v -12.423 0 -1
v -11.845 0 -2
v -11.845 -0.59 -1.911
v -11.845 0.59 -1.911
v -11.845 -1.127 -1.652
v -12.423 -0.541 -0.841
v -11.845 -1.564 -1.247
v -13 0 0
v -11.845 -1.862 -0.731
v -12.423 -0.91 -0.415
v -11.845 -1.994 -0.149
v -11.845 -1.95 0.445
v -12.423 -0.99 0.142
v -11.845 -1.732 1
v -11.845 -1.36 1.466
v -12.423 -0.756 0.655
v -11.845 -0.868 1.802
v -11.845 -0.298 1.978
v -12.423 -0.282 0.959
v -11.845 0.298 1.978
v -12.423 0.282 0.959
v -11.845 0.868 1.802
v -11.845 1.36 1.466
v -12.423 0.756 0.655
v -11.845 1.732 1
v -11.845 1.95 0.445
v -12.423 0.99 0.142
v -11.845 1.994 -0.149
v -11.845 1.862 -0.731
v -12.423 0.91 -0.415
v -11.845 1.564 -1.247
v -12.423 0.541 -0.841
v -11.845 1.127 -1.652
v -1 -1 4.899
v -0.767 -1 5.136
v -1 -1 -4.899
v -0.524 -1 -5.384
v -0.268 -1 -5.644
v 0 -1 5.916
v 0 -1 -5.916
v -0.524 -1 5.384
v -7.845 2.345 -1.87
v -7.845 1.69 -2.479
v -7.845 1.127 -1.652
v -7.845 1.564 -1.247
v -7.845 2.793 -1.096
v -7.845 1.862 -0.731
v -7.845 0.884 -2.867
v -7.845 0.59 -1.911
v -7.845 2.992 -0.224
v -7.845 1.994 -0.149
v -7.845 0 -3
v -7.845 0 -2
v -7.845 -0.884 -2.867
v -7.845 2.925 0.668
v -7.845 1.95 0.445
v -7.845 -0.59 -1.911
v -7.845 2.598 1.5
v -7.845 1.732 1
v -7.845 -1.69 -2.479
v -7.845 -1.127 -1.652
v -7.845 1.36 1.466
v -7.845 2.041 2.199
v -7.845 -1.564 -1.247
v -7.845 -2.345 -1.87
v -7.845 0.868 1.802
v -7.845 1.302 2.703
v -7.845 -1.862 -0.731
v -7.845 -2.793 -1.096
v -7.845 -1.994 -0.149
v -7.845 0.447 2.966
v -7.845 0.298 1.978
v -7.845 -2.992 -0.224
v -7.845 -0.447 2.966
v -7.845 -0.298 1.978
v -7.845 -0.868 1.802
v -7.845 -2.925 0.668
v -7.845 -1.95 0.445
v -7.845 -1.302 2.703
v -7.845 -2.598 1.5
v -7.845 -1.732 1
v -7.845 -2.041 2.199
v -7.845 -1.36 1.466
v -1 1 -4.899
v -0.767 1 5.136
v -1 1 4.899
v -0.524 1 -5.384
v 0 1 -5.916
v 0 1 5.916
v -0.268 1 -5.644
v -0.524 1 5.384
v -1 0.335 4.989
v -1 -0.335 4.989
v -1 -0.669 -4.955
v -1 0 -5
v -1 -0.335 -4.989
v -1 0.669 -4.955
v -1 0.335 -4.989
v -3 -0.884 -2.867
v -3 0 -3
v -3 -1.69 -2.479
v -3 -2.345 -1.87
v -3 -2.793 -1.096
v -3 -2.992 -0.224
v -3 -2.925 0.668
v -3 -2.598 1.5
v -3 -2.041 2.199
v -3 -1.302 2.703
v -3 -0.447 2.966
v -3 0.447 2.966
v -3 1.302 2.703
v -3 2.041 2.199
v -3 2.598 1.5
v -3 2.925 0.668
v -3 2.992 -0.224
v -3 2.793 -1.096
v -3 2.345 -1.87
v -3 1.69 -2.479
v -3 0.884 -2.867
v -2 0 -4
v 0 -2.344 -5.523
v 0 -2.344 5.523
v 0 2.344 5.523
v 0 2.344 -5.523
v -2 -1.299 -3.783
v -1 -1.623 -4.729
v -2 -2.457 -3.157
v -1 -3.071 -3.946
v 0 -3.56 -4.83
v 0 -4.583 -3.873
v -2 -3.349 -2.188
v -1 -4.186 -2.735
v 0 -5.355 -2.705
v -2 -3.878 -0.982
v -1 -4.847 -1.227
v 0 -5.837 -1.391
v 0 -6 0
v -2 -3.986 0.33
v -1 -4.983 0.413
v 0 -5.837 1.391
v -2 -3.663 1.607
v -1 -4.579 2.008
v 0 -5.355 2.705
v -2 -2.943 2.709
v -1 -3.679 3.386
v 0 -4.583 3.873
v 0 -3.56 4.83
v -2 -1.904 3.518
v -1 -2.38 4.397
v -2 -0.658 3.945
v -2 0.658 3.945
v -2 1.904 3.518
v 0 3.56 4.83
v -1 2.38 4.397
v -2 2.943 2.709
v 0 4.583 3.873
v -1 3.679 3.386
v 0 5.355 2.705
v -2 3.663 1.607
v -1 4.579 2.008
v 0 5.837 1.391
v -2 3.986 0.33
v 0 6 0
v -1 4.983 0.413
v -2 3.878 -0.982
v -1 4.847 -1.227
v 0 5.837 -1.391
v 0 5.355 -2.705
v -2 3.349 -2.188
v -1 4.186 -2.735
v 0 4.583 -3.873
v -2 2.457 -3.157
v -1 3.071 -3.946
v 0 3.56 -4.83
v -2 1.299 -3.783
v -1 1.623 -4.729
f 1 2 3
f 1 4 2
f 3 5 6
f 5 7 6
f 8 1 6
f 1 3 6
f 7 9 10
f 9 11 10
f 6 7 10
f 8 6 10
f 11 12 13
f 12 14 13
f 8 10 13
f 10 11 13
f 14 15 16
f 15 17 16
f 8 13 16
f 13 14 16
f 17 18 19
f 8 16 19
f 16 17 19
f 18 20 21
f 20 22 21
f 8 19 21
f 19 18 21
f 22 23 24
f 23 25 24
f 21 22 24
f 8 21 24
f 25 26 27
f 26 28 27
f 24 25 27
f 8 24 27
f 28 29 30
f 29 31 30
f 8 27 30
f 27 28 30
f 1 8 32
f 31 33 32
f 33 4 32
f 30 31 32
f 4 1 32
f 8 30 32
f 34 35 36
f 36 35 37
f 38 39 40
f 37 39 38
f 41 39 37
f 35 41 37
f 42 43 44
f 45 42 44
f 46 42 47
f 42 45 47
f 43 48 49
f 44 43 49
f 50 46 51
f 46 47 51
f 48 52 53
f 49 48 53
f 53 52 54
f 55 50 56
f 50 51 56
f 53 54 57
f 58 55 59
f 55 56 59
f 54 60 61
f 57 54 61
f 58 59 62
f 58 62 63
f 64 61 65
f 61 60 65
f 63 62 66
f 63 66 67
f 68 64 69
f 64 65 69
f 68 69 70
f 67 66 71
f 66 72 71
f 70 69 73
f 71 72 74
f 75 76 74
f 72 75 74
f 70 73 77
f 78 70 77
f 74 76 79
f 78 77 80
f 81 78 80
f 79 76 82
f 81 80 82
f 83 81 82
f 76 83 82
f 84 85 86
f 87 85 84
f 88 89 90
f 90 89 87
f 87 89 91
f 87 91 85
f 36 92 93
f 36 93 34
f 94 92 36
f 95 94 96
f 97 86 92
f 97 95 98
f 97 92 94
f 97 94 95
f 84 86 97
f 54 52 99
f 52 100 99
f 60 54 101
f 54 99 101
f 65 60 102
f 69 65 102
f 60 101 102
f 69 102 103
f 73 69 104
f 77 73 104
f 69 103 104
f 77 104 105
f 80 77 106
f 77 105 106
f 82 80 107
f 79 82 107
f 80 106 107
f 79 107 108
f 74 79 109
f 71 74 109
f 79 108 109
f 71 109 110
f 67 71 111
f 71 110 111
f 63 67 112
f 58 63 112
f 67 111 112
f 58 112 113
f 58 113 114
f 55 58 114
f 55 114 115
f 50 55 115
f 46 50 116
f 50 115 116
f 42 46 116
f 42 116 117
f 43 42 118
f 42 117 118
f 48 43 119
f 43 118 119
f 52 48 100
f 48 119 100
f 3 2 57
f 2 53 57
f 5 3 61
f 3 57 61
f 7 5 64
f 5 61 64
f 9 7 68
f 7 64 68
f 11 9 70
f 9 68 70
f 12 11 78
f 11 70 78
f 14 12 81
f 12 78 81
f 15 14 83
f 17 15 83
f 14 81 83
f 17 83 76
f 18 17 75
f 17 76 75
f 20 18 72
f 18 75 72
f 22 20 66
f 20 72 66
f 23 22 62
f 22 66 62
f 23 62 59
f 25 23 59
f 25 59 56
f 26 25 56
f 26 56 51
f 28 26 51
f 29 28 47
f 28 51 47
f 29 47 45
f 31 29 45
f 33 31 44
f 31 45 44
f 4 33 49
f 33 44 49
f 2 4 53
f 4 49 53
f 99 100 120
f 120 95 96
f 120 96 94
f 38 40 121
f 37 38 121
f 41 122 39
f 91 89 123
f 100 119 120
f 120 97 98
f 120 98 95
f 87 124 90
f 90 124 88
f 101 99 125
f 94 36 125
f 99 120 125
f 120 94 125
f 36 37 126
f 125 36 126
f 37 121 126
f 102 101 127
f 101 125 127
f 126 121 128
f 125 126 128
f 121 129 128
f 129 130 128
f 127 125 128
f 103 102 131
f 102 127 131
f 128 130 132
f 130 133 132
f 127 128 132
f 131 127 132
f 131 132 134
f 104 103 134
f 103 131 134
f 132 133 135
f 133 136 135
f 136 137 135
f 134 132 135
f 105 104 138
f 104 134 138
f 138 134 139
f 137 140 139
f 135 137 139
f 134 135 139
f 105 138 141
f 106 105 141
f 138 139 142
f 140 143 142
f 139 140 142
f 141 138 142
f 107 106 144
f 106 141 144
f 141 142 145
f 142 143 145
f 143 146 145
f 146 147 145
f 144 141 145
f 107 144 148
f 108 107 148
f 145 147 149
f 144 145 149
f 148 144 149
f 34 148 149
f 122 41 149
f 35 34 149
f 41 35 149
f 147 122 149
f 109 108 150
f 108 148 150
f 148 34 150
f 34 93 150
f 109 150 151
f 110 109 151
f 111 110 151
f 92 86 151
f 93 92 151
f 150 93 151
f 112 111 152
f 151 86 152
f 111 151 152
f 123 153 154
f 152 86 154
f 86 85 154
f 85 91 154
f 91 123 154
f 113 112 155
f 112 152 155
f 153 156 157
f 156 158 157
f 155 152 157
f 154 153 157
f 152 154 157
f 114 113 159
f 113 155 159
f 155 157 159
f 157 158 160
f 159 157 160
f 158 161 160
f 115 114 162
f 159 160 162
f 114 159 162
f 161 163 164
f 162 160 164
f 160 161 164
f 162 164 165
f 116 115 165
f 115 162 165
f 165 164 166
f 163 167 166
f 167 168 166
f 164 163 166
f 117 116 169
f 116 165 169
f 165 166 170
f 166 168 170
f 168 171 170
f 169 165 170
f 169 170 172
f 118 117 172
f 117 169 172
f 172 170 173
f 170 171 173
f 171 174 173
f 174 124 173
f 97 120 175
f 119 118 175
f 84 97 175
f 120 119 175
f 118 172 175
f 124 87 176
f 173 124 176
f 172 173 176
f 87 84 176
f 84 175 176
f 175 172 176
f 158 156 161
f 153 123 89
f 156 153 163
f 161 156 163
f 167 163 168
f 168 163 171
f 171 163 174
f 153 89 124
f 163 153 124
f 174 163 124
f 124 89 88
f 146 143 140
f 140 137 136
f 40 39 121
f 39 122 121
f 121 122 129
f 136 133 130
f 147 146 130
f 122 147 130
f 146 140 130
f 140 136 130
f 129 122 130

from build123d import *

# Parameters (mm, degrees)
SKETCH2_W          = 16.237911894
SKETCH2_H          = 2
CUT_EXTRUDE1_DEPTH = 1


with BuildPart() as part:
    # Sketch1 → Revolve1 (revolve)
    with BuildSketch(Plane(origin=(0, 0, 0), x_dir=(1, 0, 0), z_dir=(0, 1, 0)), mode=Mode.PRIVATE) as revolve1_sk:
        Polygon((-3, -3), (0, -6), (0, 0), (-13, 0), (-11.845299462, -2), (-7.845299462, -2), (-7.845299462, -3), align=None)
    revolve(revolve1_sk.sketch.rotate(Axis((0, 0, 0), (-1, 0, 0)), 180), axis=Axis((0, 0, 0), (-1, 0, 0)))

    # Sketch2 → Cut-Extrude1 (cut)
    with BuildSketch(Plane(origin=(0, 0, 0), x_dir=(0, 0, -1), z_dir=(1, 0, 0))):
        Rectangle(SKETCH2_W, SKETCH2_H)
    extrude(amount=-CUT_EXTRUDE1_DEPTH, mode=Mode.SUBTRACT)


solid = part.part
